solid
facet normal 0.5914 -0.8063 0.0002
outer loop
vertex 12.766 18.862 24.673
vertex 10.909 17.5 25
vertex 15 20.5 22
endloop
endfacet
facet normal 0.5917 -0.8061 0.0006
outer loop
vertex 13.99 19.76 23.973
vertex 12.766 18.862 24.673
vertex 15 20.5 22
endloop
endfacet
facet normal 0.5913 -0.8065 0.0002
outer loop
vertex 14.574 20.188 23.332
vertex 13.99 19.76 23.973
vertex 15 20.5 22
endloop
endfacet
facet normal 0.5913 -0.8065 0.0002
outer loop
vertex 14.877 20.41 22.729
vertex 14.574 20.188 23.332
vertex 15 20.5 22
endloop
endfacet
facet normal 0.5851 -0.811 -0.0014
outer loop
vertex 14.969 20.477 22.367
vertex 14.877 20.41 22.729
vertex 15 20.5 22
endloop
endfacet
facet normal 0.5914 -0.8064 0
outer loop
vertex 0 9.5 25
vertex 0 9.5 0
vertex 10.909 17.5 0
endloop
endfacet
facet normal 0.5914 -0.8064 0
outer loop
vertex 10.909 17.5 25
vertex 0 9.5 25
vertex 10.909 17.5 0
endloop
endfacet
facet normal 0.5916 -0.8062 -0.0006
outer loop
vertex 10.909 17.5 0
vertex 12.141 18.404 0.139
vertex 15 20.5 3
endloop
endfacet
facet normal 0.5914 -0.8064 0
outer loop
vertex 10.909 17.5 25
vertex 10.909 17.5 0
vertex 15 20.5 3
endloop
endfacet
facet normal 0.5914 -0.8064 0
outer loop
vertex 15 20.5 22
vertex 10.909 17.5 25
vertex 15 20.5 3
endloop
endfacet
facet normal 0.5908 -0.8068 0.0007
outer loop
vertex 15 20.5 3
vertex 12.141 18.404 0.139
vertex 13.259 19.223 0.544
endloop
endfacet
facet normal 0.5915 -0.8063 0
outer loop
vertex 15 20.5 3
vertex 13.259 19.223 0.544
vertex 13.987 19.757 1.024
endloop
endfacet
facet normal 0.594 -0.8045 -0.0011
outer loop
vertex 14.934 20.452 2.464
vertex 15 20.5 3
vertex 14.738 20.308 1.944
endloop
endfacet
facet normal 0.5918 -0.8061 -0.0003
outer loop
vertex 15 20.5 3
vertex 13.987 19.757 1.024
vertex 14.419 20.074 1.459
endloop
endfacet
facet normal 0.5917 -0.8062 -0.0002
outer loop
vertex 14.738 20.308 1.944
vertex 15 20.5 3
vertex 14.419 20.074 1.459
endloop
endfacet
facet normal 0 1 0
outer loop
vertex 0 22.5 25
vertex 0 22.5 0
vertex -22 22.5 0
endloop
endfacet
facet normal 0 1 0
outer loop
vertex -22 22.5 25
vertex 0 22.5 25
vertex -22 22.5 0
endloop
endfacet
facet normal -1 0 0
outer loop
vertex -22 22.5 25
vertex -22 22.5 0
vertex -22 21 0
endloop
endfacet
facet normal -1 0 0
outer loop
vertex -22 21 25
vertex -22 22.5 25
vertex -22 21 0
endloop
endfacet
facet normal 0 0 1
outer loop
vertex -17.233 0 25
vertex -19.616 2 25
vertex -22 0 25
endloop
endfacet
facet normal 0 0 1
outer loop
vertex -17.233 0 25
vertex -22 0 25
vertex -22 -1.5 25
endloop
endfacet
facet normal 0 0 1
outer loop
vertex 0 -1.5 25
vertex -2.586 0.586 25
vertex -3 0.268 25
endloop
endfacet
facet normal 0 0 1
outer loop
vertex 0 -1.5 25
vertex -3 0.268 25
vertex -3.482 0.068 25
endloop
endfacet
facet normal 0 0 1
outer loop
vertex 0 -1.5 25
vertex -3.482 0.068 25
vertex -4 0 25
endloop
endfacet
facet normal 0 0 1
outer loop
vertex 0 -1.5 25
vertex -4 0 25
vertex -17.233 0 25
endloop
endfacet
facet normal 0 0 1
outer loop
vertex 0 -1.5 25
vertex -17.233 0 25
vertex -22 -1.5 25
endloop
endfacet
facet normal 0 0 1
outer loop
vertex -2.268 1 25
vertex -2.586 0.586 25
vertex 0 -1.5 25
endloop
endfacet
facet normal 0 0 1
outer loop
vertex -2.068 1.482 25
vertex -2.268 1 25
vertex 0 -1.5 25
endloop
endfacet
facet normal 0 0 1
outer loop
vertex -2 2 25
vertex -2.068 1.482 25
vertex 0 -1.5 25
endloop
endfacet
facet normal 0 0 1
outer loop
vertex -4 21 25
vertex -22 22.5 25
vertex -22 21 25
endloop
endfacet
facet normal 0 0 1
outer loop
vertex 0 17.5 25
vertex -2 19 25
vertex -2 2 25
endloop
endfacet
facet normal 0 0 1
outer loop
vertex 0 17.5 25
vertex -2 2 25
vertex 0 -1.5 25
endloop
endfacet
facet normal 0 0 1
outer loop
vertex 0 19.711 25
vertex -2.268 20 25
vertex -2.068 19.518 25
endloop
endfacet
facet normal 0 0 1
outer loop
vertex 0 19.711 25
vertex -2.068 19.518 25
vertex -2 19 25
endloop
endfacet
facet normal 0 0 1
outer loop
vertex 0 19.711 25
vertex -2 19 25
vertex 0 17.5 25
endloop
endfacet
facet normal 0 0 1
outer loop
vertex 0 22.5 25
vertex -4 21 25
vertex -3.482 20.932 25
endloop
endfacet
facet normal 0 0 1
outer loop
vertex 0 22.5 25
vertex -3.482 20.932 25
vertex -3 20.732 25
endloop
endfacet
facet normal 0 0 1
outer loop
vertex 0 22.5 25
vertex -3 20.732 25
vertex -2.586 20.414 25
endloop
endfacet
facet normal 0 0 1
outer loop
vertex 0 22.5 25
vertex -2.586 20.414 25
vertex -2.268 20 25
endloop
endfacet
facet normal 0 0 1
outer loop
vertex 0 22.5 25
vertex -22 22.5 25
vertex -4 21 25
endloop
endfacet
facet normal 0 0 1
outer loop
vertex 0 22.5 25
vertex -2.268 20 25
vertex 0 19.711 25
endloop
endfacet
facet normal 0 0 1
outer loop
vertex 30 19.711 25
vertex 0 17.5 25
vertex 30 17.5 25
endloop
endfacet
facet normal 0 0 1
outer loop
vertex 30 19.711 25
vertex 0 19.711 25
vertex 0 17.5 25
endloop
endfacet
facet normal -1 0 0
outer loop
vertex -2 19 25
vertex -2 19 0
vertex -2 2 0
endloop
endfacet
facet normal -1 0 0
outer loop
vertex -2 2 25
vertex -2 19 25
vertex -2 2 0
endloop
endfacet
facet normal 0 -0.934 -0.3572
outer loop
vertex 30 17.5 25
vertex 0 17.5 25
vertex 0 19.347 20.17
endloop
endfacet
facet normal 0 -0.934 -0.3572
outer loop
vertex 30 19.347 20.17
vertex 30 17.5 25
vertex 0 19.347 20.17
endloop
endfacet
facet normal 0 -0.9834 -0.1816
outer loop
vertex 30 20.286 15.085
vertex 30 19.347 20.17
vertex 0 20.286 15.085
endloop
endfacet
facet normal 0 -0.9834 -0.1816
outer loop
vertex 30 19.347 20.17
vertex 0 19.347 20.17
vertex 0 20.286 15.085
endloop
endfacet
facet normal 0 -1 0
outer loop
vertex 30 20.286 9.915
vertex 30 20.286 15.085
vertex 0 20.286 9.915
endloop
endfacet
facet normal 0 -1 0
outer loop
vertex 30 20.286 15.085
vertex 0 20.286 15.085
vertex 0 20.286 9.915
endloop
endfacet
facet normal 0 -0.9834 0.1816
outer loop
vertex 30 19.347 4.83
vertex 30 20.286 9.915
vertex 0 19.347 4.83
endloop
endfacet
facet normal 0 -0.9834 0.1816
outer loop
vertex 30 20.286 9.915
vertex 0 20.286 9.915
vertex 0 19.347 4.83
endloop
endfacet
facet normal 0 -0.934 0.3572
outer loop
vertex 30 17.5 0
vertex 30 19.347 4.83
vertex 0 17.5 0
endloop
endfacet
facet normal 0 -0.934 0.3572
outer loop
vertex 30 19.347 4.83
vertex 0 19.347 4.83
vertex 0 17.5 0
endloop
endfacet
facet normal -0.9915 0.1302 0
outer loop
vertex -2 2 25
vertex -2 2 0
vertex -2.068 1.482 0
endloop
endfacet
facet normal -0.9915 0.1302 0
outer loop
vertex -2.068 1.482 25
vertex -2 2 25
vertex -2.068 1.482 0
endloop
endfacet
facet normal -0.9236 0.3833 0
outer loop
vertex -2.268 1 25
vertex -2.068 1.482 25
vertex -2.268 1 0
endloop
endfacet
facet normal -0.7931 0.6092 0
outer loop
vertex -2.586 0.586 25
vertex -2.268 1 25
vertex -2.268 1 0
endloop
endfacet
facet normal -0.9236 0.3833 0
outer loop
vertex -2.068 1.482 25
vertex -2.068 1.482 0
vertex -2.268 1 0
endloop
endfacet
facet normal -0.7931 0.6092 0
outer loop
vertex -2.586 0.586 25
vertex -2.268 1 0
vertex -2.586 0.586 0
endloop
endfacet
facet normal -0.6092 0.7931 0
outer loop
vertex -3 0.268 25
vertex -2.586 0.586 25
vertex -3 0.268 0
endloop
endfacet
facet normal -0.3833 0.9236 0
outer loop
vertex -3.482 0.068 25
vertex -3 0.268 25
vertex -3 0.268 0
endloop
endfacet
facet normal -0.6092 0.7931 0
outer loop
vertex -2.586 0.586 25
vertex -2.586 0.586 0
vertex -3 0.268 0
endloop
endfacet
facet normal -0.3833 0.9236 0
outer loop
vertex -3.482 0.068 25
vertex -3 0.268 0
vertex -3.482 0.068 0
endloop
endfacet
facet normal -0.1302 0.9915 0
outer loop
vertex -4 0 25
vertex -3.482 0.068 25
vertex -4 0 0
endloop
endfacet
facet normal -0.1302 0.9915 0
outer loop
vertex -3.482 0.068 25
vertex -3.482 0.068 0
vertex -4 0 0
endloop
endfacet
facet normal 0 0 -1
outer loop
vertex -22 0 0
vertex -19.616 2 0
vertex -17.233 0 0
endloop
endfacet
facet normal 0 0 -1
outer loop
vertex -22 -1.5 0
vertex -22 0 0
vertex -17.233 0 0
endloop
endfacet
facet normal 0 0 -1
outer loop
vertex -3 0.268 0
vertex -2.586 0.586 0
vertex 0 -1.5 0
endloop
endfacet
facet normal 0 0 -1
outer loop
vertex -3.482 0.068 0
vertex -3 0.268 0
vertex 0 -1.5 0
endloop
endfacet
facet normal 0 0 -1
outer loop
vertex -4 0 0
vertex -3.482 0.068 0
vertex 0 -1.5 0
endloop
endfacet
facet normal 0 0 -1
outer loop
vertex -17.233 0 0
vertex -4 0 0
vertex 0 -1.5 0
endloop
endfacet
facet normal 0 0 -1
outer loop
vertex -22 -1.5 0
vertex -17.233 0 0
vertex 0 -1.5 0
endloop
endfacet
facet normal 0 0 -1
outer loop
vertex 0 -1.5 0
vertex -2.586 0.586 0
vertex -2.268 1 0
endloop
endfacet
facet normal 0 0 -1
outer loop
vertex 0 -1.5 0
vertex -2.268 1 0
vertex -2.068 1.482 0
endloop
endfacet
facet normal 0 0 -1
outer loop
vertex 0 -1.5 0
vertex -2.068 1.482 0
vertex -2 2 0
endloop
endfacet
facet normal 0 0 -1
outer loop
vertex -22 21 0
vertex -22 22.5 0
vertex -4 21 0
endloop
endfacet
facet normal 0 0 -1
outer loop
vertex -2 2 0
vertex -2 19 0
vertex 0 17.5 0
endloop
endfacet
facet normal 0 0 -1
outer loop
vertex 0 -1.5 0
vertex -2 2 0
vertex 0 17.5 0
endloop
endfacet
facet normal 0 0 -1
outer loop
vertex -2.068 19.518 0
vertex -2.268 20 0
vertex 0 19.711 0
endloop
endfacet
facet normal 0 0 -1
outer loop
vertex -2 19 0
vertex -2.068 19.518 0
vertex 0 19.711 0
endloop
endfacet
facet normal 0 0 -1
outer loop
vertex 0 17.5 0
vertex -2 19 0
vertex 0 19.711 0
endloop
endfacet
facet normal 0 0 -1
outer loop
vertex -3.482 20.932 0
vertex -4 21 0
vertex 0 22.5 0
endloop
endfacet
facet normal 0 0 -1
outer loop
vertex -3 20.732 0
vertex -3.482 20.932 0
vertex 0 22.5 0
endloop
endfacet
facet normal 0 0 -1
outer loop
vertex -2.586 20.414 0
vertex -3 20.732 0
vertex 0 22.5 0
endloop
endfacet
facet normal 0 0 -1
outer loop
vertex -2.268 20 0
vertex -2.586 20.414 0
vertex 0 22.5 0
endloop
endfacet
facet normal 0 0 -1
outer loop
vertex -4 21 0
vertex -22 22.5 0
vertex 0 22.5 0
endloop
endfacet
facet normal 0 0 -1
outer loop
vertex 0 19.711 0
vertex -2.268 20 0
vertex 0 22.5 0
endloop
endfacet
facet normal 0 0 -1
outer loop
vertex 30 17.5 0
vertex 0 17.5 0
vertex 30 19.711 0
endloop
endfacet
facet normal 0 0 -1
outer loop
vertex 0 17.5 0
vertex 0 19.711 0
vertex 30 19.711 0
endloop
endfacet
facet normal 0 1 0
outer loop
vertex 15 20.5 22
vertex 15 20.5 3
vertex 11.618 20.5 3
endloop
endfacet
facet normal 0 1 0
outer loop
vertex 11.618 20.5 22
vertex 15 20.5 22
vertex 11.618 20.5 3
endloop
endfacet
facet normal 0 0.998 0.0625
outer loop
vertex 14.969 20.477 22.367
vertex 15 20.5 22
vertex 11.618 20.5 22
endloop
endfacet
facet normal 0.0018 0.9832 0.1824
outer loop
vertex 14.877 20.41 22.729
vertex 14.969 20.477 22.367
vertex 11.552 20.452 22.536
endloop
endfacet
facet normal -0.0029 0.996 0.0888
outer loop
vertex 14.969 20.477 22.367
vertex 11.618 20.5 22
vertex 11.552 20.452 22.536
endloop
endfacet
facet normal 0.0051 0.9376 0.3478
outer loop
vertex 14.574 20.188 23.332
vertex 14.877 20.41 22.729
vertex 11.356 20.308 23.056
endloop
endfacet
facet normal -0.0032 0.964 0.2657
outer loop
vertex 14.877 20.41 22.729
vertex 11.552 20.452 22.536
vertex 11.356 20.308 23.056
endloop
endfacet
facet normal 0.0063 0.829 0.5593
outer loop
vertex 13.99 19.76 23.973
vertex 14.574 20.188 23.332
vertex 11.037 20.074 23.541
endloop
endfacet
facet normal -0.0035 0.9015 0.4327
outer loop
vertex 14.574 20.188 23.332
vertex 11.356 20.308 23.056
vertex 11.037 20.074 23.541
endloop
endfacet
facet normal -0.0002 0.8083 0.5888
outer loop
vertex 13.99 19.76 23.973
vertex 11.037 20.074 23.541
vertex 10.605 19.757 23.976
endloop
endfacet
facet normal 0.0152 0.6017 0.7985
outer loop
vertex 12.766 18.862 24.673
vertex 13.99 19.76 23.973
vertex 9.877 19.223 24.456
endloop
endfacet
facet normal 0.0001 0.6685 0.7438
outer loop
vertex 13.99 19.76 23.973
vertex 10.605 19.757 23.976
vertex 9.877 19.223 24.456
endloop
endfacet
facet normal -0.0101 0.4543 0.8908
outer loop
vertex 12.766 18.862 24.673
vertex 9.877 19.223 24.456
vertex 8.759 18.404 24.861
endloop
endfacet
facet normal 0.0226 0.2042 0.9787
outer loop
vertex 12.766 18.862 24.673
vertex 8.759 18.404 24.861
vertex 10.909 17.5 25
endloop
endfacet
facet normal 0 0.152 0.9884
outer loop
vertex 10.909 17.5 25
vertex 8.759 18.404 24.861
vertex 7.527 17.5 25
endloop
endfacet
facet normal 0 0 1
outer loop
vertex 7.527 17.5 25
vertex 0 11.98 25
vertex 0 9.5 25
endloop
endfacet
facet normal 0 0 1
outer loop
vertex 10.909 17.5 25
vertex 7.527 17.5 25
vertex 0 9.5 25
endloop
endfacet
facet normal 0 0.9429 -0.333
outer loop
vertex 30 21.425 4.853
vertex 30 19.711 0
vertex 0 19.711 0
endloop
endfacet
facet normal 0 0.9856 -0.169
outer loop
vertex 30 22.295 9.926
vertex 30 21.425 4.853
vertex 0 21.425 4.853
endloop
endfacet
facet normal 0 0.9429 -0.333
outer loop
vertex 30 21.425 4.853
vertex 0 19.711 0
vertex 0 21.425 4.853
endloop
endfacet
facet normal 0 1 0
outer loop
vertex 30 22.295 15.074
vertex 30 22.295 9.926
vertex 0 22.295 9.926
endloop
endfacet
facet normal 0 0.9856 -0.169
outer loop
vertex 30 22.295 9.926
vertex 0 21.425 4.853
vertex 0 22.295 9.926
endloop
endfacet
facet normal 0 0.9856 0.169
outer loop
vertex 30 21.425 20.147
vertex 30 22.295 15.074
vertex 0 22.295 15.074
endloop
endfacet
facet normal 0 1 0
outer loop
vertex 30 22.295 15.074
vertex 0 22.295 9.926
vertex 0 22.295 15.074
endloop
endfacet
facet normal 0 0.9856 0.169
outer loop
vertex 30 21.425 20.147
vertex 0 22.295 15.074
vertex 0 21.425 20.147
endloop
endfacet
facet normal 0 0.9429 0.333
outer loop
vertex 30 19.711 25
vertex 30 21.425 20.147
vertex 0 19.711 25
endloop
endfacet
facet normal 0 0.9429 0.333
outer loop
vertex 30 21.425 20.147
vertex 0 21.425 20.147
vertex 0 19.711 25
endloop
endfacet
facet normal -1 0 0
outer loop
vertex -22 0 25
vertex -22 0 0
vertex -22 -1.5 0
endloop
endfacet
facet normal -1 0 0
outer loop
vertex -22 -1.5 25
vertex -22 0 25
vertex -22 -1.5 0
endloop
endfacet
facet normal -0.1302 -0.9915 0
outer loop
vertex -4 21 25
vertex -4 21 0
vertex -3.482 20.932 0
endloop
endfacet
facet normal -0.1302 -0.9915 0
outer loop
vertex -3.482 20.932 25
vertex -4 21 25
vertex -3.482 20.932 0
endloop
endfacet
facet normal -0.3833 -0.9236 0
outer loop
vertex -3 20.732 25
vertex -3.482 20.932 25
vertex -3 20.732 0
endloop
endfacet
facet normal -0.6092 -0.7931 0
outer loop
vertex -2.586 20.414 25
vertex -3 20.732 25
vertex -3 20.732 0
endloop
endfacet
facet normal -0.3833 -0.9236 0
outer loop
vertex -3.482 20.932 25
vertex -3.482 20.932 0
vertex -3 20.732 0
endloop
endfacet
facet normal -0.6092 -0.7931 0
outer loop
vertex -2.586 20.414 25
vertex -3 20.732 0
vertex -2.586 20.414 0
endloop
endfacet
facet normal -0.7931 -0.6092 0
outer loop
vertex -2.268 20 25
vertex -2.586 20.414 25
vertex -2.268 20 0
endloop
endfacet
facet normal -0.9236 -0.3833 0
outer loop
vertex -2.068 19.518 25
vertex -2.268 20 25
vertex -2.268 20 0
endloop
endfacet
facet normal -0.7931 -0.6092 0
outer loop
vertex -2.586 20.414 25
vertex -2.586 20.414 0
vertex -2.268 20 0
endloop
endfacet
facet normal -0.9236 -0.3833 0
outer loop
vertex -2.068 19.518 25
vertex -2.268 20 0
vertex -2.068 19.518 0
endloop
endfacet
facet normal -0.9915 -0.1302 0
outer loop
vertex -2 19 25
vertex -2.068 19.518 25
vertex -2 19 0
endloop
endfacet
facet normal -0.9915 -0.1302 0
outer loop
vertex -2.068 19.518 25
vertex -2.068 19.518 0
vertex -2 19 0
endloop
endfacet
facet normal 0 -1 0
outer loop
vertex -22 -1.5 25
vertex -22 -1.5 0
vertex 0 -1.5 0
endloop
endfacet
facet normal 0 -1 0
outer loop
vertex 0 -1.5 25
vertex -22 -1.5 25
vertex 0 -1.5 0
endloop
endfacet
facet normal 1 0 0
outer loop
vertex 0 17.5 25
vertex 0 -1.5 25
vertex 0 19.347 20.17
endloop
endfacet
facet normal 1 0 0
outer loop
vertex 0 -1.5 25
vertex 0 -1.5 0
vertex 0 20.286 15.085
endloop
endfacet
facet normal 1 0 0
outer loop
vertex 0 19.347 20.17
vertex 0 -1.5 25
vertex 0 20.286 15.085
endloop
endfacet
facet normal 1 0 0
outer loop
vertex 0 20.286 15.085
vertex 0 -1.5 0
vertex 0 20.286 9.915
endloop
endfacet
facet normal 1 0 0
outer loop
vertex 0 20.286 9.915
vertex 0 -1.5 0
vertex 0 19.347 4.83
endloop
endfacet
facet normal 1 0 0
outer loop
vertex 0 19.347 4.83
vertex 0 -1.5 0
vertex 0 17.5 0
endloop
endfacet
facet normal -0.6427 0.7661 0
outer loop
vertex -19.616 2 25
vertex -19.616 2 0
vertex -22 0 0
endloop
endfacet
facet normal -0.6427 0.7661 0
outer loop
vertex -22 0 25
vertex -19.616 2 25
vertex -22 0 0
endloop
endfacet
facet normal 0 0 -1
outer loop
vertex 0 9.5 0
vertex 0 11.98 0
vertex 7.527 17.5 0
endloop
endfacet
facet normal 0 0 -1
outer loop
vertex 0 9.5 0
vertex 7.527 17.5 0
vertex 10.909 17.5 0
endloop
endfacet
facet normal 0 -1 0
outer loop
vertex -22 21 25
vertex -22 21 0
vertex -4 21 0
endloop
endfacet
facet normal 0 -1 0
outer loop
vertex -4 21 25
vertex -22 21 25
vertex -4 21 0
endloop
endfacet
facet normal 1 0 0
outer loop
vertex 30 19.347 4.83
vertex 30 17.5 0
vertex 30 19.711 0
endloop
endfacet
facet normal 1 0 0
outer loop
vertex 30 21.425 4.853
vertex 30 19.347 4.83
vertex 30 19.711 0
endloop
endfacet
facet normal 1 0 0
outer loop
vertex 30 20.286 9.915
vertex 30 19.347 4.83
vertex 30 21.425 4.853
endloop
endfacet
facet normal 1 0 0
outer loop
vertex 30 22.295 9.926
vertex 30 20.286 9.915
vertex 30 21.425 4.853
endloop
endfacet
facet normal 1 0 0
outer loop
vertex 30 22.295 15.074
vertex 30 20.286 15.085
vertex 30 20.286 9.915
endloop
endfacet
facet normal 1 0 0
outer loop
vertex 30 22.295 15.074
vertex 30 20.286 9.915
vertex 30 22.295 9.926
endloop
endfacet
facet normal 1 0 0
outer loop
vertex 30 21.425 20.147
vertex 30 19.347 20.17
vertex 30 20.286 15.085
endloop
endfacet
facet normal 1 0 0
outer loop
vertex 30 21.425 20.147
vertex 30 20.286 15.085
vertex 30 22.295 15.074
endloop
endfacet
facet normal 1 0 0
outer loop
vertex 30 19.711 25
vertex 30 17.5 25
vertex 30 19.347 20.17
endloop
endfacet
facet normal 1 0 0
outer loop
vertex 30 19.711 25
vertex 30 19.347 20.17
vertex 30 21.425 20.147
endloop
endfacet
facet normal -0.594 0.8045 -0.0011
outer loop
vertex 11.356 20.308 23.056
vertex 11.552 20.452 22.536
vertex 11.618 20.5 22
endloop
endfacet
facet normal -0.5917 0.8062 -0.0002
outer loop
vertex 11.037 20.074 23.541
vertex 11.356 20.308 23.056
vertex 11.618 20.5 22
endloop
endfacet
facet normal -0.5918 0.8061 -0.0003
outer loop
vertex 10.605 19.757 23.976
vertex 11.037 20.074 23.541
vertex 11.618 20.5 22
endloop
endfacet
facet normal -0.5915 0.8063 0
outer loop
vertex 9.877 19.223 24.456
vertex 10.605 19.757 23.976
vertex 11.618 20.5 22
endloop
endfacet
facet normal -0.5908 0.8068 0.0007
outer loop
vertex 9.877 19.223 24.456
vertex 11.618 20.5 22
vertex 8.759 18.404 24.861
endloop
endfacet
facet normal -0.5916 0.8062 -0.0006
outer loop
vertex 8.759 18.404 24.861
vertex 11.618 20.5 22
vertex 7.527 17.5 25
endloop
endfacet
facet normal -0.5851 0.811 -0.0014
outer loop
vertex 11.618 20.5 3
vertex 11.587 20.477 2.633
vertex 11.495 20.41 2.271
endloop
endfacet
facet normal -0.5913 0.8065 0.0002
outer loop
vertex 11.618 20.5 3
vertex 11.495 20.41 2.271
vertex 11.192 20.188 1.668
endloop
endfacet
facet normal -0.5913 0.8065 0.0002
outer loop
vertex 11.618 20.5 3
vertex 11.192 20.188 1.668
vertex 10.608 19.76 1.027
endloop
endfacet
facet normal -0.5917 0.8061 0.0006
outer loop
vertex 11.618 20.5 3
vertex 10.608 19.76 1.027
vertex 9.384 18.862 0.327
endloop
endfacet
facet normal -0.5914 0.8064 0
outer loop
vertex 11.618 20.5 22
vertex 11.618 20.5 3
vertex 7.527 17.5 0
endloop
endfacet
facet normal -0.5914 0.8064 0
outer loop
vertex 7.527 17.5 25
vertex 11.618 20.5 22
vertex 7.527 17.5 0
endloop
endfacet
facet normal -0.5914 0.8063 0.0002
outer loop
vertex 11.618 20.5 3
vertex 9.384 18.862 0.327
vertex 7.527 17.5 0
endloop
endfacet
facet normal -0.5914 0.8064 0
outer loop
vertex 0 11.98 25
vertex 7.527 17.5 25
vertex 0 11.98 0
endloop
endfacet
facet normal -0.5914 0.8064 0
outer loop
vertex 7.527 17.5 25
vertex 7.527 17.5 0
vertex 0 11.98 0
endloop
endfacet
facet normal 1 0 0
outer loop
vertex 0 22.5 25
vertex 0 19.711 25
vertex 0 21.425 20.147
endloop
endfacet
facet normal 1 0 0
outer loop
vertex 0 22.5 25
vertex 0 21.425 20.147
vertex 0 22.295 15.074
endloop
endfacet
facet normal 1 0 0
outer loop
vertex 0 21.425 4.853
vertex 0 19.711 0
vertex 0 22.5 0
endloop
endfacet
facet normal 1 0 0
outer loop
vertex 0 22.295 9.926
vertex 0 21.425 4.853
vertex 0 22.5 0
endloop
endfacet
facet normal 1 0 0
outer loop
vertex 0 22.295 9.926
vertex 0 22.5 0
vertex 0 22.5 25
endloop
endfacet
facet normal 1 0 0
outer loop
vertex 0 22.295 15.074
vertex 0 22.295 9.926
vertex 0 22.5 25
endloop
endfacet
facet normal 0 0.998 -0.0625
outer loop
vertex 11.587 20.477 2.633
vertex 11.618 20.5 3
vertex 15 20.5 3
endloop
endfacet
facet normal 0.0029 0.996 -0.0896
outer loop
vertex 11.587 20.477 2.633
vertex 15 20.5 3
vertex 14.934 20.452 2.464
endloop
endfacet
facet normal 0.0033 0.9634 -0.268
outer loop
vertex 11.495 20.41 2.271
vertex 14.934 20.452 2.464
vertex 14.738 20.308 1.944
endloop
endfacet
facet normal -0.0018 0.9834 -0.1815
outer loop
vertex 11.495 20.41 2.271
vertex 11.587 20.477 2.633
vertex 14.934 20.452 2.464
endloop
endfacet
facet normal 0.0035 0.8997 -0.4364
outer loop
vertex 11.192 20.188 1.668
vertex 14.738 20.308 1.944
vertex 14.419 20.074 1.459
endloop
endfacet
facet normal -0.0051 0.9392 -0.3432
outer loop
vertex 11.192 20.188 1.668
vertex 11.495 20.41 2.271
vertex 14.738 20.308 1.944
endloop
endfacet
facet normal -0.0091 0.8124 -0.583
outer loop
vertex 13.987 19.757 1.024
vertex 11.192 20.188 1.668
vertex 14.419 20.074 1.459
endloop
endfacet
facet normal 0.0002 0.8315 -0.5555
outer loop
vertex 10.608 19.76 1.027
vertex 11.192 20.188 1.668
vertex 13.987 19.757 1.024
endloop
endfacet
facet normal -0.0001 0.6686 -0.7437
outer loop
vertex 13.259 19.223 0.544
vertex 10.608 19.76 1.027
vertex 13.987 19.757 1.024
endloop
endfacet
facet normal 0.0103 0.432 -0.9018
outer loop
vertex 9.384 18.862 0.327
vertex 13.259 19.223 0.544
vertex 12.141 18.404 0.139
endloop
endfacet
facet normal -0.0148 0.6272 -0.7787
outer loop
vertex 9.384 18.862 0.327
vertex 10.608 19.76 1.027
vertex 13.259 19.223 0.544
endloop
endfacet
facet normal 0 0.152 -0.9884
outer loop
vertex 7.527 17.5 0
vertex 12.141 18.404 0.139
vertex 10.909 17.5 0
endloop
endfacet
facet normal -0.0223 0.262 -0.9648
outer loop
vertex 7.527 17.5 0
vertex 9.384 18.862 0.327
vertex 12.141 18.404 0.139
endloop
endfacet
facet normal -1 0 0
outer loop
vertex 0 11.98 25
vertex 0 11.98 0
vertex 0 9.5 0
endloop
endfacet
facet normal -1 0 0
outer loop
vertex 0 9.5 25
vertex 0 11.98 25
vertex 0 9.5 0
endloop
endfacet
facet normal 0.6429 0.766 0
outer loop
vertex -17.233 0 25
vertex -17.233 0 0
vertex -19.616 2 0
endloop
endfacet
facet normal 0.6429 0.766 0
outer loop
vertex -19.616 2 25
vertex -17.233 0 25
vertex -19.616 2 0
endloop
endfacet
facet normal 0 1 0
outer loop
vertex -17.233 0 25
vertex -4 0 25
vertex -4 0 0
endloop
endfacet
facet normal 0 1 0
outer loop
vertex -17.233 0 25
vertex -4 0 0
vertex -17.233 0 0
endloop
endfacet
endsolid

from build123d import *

# Parameters (mm, degrees)
F1_DEPTH    = 25
F3_DEPTH    = 30
F4_DEPTH    = 25
F5_T1_DEPTH = 18.3820136796


# Not quite as in the source:
# - a fillet or chamfer that OpenCascade refuses, or shapes differently, is made with other operations: its cross-section is extruded or revolved along the edge and cut away or added


with BuildPart() as f1:
    # F0 (on Top) → F1 (new body)
    with BuildSketch(Plane.XY):
        with BuildLine():
            Line((0, 22.5), (-22, 22.5))
            Line((-22, 22.5), (-22, 21))
            Line((-22, 21), (-17.2329856296, 21))
            Line((-17.2329856296, 21), (-4, 21))
            ThreePointArc((-4, 21), (-2.5857864376, 20.4142135624), (-2, 19))
            Line((-2, 19), (-2, 10.5))
            Line((-2, 10.5), (-2, 2))
            ThreePointArc((-2, 2), (-2.5857864376, 0.5857864376), (-4, 0))
            Line((-4, 0), (-17.2329856296, 0))
            Line((-17.2329856296, 0), (-22, 0))
            Line((-22, 0), (-22, -1.5))
            Line((-22, -1.5), (-2, -1.5))
            Line((-2, -1.5), (0, -1.5))
            Line((0, -1.5), (0, 9.5))
            Line((0, 9.5), (0, 11.980143365))
            Line((0, 11.980143365), (0, 17.5))
            Line((0, 17.5), (0, 22.5))
        make_face()
        Polygon((-19.6164928148, 2), (-22, 0), (-17.2329856296, 0), align=None)
    extrude(amount=F1_DEPTH)

    # F2 (on face) → F3 (join)
    with BuildSketch(Plane.YZ):
        with BuildLine():
            ThreePointArc((17.5, 25), (20.40460778, 12.5), (17.5, 0))
            Line((17.5, 0), (19.7108604723, 0))
            ThreePointArc((19.7108604723, 0), (22.40460778, 12.5), (19.7108604723, 25))
            Line((19.7108604723, 25), (17.5, 25))
        make_face()
    extrude(amount=F3_DEPTH)


with BuildPart() as f4:
    # F0 (on Top) → F4 (new body)
    with BuildSketch(Plane.XY):
        Polygon((11.6179863204, 20.5), (0, 11.980143365), (0, 9.5), (15, 20.5), align=None)
    extrude(amount=F4_DEPTH)

    # F5: fillet of radius 3 on 2 edges, made by hand

    # F5_s2 → F5_t1 (cut)
    with BuildSketch(Plane.YZ.offset(4.1179863204)):
        with BuildLine():
            ThreePointArc((20.5, 22), (19.6213203436, 24.1213203436), (17.5, 25))
            Line((17.5, 25), (20.5, 25))
            Line((20.5, 25), (20.5, 22))
        make_face()
        with BuildLine():
            ThreePointArc((20.5, 3), (19.6213203436, 0.8786796564), (17.5, 0))
            Line((17.5, 0), (20.5, 0))
            Line((20.5, 0), (20.5, 3))
        make_face()
    extrude(amount=F5_T1_DEPTH, mode=Mode.SUBTRACT)


solid = Compound([f1.part, f4.part])
